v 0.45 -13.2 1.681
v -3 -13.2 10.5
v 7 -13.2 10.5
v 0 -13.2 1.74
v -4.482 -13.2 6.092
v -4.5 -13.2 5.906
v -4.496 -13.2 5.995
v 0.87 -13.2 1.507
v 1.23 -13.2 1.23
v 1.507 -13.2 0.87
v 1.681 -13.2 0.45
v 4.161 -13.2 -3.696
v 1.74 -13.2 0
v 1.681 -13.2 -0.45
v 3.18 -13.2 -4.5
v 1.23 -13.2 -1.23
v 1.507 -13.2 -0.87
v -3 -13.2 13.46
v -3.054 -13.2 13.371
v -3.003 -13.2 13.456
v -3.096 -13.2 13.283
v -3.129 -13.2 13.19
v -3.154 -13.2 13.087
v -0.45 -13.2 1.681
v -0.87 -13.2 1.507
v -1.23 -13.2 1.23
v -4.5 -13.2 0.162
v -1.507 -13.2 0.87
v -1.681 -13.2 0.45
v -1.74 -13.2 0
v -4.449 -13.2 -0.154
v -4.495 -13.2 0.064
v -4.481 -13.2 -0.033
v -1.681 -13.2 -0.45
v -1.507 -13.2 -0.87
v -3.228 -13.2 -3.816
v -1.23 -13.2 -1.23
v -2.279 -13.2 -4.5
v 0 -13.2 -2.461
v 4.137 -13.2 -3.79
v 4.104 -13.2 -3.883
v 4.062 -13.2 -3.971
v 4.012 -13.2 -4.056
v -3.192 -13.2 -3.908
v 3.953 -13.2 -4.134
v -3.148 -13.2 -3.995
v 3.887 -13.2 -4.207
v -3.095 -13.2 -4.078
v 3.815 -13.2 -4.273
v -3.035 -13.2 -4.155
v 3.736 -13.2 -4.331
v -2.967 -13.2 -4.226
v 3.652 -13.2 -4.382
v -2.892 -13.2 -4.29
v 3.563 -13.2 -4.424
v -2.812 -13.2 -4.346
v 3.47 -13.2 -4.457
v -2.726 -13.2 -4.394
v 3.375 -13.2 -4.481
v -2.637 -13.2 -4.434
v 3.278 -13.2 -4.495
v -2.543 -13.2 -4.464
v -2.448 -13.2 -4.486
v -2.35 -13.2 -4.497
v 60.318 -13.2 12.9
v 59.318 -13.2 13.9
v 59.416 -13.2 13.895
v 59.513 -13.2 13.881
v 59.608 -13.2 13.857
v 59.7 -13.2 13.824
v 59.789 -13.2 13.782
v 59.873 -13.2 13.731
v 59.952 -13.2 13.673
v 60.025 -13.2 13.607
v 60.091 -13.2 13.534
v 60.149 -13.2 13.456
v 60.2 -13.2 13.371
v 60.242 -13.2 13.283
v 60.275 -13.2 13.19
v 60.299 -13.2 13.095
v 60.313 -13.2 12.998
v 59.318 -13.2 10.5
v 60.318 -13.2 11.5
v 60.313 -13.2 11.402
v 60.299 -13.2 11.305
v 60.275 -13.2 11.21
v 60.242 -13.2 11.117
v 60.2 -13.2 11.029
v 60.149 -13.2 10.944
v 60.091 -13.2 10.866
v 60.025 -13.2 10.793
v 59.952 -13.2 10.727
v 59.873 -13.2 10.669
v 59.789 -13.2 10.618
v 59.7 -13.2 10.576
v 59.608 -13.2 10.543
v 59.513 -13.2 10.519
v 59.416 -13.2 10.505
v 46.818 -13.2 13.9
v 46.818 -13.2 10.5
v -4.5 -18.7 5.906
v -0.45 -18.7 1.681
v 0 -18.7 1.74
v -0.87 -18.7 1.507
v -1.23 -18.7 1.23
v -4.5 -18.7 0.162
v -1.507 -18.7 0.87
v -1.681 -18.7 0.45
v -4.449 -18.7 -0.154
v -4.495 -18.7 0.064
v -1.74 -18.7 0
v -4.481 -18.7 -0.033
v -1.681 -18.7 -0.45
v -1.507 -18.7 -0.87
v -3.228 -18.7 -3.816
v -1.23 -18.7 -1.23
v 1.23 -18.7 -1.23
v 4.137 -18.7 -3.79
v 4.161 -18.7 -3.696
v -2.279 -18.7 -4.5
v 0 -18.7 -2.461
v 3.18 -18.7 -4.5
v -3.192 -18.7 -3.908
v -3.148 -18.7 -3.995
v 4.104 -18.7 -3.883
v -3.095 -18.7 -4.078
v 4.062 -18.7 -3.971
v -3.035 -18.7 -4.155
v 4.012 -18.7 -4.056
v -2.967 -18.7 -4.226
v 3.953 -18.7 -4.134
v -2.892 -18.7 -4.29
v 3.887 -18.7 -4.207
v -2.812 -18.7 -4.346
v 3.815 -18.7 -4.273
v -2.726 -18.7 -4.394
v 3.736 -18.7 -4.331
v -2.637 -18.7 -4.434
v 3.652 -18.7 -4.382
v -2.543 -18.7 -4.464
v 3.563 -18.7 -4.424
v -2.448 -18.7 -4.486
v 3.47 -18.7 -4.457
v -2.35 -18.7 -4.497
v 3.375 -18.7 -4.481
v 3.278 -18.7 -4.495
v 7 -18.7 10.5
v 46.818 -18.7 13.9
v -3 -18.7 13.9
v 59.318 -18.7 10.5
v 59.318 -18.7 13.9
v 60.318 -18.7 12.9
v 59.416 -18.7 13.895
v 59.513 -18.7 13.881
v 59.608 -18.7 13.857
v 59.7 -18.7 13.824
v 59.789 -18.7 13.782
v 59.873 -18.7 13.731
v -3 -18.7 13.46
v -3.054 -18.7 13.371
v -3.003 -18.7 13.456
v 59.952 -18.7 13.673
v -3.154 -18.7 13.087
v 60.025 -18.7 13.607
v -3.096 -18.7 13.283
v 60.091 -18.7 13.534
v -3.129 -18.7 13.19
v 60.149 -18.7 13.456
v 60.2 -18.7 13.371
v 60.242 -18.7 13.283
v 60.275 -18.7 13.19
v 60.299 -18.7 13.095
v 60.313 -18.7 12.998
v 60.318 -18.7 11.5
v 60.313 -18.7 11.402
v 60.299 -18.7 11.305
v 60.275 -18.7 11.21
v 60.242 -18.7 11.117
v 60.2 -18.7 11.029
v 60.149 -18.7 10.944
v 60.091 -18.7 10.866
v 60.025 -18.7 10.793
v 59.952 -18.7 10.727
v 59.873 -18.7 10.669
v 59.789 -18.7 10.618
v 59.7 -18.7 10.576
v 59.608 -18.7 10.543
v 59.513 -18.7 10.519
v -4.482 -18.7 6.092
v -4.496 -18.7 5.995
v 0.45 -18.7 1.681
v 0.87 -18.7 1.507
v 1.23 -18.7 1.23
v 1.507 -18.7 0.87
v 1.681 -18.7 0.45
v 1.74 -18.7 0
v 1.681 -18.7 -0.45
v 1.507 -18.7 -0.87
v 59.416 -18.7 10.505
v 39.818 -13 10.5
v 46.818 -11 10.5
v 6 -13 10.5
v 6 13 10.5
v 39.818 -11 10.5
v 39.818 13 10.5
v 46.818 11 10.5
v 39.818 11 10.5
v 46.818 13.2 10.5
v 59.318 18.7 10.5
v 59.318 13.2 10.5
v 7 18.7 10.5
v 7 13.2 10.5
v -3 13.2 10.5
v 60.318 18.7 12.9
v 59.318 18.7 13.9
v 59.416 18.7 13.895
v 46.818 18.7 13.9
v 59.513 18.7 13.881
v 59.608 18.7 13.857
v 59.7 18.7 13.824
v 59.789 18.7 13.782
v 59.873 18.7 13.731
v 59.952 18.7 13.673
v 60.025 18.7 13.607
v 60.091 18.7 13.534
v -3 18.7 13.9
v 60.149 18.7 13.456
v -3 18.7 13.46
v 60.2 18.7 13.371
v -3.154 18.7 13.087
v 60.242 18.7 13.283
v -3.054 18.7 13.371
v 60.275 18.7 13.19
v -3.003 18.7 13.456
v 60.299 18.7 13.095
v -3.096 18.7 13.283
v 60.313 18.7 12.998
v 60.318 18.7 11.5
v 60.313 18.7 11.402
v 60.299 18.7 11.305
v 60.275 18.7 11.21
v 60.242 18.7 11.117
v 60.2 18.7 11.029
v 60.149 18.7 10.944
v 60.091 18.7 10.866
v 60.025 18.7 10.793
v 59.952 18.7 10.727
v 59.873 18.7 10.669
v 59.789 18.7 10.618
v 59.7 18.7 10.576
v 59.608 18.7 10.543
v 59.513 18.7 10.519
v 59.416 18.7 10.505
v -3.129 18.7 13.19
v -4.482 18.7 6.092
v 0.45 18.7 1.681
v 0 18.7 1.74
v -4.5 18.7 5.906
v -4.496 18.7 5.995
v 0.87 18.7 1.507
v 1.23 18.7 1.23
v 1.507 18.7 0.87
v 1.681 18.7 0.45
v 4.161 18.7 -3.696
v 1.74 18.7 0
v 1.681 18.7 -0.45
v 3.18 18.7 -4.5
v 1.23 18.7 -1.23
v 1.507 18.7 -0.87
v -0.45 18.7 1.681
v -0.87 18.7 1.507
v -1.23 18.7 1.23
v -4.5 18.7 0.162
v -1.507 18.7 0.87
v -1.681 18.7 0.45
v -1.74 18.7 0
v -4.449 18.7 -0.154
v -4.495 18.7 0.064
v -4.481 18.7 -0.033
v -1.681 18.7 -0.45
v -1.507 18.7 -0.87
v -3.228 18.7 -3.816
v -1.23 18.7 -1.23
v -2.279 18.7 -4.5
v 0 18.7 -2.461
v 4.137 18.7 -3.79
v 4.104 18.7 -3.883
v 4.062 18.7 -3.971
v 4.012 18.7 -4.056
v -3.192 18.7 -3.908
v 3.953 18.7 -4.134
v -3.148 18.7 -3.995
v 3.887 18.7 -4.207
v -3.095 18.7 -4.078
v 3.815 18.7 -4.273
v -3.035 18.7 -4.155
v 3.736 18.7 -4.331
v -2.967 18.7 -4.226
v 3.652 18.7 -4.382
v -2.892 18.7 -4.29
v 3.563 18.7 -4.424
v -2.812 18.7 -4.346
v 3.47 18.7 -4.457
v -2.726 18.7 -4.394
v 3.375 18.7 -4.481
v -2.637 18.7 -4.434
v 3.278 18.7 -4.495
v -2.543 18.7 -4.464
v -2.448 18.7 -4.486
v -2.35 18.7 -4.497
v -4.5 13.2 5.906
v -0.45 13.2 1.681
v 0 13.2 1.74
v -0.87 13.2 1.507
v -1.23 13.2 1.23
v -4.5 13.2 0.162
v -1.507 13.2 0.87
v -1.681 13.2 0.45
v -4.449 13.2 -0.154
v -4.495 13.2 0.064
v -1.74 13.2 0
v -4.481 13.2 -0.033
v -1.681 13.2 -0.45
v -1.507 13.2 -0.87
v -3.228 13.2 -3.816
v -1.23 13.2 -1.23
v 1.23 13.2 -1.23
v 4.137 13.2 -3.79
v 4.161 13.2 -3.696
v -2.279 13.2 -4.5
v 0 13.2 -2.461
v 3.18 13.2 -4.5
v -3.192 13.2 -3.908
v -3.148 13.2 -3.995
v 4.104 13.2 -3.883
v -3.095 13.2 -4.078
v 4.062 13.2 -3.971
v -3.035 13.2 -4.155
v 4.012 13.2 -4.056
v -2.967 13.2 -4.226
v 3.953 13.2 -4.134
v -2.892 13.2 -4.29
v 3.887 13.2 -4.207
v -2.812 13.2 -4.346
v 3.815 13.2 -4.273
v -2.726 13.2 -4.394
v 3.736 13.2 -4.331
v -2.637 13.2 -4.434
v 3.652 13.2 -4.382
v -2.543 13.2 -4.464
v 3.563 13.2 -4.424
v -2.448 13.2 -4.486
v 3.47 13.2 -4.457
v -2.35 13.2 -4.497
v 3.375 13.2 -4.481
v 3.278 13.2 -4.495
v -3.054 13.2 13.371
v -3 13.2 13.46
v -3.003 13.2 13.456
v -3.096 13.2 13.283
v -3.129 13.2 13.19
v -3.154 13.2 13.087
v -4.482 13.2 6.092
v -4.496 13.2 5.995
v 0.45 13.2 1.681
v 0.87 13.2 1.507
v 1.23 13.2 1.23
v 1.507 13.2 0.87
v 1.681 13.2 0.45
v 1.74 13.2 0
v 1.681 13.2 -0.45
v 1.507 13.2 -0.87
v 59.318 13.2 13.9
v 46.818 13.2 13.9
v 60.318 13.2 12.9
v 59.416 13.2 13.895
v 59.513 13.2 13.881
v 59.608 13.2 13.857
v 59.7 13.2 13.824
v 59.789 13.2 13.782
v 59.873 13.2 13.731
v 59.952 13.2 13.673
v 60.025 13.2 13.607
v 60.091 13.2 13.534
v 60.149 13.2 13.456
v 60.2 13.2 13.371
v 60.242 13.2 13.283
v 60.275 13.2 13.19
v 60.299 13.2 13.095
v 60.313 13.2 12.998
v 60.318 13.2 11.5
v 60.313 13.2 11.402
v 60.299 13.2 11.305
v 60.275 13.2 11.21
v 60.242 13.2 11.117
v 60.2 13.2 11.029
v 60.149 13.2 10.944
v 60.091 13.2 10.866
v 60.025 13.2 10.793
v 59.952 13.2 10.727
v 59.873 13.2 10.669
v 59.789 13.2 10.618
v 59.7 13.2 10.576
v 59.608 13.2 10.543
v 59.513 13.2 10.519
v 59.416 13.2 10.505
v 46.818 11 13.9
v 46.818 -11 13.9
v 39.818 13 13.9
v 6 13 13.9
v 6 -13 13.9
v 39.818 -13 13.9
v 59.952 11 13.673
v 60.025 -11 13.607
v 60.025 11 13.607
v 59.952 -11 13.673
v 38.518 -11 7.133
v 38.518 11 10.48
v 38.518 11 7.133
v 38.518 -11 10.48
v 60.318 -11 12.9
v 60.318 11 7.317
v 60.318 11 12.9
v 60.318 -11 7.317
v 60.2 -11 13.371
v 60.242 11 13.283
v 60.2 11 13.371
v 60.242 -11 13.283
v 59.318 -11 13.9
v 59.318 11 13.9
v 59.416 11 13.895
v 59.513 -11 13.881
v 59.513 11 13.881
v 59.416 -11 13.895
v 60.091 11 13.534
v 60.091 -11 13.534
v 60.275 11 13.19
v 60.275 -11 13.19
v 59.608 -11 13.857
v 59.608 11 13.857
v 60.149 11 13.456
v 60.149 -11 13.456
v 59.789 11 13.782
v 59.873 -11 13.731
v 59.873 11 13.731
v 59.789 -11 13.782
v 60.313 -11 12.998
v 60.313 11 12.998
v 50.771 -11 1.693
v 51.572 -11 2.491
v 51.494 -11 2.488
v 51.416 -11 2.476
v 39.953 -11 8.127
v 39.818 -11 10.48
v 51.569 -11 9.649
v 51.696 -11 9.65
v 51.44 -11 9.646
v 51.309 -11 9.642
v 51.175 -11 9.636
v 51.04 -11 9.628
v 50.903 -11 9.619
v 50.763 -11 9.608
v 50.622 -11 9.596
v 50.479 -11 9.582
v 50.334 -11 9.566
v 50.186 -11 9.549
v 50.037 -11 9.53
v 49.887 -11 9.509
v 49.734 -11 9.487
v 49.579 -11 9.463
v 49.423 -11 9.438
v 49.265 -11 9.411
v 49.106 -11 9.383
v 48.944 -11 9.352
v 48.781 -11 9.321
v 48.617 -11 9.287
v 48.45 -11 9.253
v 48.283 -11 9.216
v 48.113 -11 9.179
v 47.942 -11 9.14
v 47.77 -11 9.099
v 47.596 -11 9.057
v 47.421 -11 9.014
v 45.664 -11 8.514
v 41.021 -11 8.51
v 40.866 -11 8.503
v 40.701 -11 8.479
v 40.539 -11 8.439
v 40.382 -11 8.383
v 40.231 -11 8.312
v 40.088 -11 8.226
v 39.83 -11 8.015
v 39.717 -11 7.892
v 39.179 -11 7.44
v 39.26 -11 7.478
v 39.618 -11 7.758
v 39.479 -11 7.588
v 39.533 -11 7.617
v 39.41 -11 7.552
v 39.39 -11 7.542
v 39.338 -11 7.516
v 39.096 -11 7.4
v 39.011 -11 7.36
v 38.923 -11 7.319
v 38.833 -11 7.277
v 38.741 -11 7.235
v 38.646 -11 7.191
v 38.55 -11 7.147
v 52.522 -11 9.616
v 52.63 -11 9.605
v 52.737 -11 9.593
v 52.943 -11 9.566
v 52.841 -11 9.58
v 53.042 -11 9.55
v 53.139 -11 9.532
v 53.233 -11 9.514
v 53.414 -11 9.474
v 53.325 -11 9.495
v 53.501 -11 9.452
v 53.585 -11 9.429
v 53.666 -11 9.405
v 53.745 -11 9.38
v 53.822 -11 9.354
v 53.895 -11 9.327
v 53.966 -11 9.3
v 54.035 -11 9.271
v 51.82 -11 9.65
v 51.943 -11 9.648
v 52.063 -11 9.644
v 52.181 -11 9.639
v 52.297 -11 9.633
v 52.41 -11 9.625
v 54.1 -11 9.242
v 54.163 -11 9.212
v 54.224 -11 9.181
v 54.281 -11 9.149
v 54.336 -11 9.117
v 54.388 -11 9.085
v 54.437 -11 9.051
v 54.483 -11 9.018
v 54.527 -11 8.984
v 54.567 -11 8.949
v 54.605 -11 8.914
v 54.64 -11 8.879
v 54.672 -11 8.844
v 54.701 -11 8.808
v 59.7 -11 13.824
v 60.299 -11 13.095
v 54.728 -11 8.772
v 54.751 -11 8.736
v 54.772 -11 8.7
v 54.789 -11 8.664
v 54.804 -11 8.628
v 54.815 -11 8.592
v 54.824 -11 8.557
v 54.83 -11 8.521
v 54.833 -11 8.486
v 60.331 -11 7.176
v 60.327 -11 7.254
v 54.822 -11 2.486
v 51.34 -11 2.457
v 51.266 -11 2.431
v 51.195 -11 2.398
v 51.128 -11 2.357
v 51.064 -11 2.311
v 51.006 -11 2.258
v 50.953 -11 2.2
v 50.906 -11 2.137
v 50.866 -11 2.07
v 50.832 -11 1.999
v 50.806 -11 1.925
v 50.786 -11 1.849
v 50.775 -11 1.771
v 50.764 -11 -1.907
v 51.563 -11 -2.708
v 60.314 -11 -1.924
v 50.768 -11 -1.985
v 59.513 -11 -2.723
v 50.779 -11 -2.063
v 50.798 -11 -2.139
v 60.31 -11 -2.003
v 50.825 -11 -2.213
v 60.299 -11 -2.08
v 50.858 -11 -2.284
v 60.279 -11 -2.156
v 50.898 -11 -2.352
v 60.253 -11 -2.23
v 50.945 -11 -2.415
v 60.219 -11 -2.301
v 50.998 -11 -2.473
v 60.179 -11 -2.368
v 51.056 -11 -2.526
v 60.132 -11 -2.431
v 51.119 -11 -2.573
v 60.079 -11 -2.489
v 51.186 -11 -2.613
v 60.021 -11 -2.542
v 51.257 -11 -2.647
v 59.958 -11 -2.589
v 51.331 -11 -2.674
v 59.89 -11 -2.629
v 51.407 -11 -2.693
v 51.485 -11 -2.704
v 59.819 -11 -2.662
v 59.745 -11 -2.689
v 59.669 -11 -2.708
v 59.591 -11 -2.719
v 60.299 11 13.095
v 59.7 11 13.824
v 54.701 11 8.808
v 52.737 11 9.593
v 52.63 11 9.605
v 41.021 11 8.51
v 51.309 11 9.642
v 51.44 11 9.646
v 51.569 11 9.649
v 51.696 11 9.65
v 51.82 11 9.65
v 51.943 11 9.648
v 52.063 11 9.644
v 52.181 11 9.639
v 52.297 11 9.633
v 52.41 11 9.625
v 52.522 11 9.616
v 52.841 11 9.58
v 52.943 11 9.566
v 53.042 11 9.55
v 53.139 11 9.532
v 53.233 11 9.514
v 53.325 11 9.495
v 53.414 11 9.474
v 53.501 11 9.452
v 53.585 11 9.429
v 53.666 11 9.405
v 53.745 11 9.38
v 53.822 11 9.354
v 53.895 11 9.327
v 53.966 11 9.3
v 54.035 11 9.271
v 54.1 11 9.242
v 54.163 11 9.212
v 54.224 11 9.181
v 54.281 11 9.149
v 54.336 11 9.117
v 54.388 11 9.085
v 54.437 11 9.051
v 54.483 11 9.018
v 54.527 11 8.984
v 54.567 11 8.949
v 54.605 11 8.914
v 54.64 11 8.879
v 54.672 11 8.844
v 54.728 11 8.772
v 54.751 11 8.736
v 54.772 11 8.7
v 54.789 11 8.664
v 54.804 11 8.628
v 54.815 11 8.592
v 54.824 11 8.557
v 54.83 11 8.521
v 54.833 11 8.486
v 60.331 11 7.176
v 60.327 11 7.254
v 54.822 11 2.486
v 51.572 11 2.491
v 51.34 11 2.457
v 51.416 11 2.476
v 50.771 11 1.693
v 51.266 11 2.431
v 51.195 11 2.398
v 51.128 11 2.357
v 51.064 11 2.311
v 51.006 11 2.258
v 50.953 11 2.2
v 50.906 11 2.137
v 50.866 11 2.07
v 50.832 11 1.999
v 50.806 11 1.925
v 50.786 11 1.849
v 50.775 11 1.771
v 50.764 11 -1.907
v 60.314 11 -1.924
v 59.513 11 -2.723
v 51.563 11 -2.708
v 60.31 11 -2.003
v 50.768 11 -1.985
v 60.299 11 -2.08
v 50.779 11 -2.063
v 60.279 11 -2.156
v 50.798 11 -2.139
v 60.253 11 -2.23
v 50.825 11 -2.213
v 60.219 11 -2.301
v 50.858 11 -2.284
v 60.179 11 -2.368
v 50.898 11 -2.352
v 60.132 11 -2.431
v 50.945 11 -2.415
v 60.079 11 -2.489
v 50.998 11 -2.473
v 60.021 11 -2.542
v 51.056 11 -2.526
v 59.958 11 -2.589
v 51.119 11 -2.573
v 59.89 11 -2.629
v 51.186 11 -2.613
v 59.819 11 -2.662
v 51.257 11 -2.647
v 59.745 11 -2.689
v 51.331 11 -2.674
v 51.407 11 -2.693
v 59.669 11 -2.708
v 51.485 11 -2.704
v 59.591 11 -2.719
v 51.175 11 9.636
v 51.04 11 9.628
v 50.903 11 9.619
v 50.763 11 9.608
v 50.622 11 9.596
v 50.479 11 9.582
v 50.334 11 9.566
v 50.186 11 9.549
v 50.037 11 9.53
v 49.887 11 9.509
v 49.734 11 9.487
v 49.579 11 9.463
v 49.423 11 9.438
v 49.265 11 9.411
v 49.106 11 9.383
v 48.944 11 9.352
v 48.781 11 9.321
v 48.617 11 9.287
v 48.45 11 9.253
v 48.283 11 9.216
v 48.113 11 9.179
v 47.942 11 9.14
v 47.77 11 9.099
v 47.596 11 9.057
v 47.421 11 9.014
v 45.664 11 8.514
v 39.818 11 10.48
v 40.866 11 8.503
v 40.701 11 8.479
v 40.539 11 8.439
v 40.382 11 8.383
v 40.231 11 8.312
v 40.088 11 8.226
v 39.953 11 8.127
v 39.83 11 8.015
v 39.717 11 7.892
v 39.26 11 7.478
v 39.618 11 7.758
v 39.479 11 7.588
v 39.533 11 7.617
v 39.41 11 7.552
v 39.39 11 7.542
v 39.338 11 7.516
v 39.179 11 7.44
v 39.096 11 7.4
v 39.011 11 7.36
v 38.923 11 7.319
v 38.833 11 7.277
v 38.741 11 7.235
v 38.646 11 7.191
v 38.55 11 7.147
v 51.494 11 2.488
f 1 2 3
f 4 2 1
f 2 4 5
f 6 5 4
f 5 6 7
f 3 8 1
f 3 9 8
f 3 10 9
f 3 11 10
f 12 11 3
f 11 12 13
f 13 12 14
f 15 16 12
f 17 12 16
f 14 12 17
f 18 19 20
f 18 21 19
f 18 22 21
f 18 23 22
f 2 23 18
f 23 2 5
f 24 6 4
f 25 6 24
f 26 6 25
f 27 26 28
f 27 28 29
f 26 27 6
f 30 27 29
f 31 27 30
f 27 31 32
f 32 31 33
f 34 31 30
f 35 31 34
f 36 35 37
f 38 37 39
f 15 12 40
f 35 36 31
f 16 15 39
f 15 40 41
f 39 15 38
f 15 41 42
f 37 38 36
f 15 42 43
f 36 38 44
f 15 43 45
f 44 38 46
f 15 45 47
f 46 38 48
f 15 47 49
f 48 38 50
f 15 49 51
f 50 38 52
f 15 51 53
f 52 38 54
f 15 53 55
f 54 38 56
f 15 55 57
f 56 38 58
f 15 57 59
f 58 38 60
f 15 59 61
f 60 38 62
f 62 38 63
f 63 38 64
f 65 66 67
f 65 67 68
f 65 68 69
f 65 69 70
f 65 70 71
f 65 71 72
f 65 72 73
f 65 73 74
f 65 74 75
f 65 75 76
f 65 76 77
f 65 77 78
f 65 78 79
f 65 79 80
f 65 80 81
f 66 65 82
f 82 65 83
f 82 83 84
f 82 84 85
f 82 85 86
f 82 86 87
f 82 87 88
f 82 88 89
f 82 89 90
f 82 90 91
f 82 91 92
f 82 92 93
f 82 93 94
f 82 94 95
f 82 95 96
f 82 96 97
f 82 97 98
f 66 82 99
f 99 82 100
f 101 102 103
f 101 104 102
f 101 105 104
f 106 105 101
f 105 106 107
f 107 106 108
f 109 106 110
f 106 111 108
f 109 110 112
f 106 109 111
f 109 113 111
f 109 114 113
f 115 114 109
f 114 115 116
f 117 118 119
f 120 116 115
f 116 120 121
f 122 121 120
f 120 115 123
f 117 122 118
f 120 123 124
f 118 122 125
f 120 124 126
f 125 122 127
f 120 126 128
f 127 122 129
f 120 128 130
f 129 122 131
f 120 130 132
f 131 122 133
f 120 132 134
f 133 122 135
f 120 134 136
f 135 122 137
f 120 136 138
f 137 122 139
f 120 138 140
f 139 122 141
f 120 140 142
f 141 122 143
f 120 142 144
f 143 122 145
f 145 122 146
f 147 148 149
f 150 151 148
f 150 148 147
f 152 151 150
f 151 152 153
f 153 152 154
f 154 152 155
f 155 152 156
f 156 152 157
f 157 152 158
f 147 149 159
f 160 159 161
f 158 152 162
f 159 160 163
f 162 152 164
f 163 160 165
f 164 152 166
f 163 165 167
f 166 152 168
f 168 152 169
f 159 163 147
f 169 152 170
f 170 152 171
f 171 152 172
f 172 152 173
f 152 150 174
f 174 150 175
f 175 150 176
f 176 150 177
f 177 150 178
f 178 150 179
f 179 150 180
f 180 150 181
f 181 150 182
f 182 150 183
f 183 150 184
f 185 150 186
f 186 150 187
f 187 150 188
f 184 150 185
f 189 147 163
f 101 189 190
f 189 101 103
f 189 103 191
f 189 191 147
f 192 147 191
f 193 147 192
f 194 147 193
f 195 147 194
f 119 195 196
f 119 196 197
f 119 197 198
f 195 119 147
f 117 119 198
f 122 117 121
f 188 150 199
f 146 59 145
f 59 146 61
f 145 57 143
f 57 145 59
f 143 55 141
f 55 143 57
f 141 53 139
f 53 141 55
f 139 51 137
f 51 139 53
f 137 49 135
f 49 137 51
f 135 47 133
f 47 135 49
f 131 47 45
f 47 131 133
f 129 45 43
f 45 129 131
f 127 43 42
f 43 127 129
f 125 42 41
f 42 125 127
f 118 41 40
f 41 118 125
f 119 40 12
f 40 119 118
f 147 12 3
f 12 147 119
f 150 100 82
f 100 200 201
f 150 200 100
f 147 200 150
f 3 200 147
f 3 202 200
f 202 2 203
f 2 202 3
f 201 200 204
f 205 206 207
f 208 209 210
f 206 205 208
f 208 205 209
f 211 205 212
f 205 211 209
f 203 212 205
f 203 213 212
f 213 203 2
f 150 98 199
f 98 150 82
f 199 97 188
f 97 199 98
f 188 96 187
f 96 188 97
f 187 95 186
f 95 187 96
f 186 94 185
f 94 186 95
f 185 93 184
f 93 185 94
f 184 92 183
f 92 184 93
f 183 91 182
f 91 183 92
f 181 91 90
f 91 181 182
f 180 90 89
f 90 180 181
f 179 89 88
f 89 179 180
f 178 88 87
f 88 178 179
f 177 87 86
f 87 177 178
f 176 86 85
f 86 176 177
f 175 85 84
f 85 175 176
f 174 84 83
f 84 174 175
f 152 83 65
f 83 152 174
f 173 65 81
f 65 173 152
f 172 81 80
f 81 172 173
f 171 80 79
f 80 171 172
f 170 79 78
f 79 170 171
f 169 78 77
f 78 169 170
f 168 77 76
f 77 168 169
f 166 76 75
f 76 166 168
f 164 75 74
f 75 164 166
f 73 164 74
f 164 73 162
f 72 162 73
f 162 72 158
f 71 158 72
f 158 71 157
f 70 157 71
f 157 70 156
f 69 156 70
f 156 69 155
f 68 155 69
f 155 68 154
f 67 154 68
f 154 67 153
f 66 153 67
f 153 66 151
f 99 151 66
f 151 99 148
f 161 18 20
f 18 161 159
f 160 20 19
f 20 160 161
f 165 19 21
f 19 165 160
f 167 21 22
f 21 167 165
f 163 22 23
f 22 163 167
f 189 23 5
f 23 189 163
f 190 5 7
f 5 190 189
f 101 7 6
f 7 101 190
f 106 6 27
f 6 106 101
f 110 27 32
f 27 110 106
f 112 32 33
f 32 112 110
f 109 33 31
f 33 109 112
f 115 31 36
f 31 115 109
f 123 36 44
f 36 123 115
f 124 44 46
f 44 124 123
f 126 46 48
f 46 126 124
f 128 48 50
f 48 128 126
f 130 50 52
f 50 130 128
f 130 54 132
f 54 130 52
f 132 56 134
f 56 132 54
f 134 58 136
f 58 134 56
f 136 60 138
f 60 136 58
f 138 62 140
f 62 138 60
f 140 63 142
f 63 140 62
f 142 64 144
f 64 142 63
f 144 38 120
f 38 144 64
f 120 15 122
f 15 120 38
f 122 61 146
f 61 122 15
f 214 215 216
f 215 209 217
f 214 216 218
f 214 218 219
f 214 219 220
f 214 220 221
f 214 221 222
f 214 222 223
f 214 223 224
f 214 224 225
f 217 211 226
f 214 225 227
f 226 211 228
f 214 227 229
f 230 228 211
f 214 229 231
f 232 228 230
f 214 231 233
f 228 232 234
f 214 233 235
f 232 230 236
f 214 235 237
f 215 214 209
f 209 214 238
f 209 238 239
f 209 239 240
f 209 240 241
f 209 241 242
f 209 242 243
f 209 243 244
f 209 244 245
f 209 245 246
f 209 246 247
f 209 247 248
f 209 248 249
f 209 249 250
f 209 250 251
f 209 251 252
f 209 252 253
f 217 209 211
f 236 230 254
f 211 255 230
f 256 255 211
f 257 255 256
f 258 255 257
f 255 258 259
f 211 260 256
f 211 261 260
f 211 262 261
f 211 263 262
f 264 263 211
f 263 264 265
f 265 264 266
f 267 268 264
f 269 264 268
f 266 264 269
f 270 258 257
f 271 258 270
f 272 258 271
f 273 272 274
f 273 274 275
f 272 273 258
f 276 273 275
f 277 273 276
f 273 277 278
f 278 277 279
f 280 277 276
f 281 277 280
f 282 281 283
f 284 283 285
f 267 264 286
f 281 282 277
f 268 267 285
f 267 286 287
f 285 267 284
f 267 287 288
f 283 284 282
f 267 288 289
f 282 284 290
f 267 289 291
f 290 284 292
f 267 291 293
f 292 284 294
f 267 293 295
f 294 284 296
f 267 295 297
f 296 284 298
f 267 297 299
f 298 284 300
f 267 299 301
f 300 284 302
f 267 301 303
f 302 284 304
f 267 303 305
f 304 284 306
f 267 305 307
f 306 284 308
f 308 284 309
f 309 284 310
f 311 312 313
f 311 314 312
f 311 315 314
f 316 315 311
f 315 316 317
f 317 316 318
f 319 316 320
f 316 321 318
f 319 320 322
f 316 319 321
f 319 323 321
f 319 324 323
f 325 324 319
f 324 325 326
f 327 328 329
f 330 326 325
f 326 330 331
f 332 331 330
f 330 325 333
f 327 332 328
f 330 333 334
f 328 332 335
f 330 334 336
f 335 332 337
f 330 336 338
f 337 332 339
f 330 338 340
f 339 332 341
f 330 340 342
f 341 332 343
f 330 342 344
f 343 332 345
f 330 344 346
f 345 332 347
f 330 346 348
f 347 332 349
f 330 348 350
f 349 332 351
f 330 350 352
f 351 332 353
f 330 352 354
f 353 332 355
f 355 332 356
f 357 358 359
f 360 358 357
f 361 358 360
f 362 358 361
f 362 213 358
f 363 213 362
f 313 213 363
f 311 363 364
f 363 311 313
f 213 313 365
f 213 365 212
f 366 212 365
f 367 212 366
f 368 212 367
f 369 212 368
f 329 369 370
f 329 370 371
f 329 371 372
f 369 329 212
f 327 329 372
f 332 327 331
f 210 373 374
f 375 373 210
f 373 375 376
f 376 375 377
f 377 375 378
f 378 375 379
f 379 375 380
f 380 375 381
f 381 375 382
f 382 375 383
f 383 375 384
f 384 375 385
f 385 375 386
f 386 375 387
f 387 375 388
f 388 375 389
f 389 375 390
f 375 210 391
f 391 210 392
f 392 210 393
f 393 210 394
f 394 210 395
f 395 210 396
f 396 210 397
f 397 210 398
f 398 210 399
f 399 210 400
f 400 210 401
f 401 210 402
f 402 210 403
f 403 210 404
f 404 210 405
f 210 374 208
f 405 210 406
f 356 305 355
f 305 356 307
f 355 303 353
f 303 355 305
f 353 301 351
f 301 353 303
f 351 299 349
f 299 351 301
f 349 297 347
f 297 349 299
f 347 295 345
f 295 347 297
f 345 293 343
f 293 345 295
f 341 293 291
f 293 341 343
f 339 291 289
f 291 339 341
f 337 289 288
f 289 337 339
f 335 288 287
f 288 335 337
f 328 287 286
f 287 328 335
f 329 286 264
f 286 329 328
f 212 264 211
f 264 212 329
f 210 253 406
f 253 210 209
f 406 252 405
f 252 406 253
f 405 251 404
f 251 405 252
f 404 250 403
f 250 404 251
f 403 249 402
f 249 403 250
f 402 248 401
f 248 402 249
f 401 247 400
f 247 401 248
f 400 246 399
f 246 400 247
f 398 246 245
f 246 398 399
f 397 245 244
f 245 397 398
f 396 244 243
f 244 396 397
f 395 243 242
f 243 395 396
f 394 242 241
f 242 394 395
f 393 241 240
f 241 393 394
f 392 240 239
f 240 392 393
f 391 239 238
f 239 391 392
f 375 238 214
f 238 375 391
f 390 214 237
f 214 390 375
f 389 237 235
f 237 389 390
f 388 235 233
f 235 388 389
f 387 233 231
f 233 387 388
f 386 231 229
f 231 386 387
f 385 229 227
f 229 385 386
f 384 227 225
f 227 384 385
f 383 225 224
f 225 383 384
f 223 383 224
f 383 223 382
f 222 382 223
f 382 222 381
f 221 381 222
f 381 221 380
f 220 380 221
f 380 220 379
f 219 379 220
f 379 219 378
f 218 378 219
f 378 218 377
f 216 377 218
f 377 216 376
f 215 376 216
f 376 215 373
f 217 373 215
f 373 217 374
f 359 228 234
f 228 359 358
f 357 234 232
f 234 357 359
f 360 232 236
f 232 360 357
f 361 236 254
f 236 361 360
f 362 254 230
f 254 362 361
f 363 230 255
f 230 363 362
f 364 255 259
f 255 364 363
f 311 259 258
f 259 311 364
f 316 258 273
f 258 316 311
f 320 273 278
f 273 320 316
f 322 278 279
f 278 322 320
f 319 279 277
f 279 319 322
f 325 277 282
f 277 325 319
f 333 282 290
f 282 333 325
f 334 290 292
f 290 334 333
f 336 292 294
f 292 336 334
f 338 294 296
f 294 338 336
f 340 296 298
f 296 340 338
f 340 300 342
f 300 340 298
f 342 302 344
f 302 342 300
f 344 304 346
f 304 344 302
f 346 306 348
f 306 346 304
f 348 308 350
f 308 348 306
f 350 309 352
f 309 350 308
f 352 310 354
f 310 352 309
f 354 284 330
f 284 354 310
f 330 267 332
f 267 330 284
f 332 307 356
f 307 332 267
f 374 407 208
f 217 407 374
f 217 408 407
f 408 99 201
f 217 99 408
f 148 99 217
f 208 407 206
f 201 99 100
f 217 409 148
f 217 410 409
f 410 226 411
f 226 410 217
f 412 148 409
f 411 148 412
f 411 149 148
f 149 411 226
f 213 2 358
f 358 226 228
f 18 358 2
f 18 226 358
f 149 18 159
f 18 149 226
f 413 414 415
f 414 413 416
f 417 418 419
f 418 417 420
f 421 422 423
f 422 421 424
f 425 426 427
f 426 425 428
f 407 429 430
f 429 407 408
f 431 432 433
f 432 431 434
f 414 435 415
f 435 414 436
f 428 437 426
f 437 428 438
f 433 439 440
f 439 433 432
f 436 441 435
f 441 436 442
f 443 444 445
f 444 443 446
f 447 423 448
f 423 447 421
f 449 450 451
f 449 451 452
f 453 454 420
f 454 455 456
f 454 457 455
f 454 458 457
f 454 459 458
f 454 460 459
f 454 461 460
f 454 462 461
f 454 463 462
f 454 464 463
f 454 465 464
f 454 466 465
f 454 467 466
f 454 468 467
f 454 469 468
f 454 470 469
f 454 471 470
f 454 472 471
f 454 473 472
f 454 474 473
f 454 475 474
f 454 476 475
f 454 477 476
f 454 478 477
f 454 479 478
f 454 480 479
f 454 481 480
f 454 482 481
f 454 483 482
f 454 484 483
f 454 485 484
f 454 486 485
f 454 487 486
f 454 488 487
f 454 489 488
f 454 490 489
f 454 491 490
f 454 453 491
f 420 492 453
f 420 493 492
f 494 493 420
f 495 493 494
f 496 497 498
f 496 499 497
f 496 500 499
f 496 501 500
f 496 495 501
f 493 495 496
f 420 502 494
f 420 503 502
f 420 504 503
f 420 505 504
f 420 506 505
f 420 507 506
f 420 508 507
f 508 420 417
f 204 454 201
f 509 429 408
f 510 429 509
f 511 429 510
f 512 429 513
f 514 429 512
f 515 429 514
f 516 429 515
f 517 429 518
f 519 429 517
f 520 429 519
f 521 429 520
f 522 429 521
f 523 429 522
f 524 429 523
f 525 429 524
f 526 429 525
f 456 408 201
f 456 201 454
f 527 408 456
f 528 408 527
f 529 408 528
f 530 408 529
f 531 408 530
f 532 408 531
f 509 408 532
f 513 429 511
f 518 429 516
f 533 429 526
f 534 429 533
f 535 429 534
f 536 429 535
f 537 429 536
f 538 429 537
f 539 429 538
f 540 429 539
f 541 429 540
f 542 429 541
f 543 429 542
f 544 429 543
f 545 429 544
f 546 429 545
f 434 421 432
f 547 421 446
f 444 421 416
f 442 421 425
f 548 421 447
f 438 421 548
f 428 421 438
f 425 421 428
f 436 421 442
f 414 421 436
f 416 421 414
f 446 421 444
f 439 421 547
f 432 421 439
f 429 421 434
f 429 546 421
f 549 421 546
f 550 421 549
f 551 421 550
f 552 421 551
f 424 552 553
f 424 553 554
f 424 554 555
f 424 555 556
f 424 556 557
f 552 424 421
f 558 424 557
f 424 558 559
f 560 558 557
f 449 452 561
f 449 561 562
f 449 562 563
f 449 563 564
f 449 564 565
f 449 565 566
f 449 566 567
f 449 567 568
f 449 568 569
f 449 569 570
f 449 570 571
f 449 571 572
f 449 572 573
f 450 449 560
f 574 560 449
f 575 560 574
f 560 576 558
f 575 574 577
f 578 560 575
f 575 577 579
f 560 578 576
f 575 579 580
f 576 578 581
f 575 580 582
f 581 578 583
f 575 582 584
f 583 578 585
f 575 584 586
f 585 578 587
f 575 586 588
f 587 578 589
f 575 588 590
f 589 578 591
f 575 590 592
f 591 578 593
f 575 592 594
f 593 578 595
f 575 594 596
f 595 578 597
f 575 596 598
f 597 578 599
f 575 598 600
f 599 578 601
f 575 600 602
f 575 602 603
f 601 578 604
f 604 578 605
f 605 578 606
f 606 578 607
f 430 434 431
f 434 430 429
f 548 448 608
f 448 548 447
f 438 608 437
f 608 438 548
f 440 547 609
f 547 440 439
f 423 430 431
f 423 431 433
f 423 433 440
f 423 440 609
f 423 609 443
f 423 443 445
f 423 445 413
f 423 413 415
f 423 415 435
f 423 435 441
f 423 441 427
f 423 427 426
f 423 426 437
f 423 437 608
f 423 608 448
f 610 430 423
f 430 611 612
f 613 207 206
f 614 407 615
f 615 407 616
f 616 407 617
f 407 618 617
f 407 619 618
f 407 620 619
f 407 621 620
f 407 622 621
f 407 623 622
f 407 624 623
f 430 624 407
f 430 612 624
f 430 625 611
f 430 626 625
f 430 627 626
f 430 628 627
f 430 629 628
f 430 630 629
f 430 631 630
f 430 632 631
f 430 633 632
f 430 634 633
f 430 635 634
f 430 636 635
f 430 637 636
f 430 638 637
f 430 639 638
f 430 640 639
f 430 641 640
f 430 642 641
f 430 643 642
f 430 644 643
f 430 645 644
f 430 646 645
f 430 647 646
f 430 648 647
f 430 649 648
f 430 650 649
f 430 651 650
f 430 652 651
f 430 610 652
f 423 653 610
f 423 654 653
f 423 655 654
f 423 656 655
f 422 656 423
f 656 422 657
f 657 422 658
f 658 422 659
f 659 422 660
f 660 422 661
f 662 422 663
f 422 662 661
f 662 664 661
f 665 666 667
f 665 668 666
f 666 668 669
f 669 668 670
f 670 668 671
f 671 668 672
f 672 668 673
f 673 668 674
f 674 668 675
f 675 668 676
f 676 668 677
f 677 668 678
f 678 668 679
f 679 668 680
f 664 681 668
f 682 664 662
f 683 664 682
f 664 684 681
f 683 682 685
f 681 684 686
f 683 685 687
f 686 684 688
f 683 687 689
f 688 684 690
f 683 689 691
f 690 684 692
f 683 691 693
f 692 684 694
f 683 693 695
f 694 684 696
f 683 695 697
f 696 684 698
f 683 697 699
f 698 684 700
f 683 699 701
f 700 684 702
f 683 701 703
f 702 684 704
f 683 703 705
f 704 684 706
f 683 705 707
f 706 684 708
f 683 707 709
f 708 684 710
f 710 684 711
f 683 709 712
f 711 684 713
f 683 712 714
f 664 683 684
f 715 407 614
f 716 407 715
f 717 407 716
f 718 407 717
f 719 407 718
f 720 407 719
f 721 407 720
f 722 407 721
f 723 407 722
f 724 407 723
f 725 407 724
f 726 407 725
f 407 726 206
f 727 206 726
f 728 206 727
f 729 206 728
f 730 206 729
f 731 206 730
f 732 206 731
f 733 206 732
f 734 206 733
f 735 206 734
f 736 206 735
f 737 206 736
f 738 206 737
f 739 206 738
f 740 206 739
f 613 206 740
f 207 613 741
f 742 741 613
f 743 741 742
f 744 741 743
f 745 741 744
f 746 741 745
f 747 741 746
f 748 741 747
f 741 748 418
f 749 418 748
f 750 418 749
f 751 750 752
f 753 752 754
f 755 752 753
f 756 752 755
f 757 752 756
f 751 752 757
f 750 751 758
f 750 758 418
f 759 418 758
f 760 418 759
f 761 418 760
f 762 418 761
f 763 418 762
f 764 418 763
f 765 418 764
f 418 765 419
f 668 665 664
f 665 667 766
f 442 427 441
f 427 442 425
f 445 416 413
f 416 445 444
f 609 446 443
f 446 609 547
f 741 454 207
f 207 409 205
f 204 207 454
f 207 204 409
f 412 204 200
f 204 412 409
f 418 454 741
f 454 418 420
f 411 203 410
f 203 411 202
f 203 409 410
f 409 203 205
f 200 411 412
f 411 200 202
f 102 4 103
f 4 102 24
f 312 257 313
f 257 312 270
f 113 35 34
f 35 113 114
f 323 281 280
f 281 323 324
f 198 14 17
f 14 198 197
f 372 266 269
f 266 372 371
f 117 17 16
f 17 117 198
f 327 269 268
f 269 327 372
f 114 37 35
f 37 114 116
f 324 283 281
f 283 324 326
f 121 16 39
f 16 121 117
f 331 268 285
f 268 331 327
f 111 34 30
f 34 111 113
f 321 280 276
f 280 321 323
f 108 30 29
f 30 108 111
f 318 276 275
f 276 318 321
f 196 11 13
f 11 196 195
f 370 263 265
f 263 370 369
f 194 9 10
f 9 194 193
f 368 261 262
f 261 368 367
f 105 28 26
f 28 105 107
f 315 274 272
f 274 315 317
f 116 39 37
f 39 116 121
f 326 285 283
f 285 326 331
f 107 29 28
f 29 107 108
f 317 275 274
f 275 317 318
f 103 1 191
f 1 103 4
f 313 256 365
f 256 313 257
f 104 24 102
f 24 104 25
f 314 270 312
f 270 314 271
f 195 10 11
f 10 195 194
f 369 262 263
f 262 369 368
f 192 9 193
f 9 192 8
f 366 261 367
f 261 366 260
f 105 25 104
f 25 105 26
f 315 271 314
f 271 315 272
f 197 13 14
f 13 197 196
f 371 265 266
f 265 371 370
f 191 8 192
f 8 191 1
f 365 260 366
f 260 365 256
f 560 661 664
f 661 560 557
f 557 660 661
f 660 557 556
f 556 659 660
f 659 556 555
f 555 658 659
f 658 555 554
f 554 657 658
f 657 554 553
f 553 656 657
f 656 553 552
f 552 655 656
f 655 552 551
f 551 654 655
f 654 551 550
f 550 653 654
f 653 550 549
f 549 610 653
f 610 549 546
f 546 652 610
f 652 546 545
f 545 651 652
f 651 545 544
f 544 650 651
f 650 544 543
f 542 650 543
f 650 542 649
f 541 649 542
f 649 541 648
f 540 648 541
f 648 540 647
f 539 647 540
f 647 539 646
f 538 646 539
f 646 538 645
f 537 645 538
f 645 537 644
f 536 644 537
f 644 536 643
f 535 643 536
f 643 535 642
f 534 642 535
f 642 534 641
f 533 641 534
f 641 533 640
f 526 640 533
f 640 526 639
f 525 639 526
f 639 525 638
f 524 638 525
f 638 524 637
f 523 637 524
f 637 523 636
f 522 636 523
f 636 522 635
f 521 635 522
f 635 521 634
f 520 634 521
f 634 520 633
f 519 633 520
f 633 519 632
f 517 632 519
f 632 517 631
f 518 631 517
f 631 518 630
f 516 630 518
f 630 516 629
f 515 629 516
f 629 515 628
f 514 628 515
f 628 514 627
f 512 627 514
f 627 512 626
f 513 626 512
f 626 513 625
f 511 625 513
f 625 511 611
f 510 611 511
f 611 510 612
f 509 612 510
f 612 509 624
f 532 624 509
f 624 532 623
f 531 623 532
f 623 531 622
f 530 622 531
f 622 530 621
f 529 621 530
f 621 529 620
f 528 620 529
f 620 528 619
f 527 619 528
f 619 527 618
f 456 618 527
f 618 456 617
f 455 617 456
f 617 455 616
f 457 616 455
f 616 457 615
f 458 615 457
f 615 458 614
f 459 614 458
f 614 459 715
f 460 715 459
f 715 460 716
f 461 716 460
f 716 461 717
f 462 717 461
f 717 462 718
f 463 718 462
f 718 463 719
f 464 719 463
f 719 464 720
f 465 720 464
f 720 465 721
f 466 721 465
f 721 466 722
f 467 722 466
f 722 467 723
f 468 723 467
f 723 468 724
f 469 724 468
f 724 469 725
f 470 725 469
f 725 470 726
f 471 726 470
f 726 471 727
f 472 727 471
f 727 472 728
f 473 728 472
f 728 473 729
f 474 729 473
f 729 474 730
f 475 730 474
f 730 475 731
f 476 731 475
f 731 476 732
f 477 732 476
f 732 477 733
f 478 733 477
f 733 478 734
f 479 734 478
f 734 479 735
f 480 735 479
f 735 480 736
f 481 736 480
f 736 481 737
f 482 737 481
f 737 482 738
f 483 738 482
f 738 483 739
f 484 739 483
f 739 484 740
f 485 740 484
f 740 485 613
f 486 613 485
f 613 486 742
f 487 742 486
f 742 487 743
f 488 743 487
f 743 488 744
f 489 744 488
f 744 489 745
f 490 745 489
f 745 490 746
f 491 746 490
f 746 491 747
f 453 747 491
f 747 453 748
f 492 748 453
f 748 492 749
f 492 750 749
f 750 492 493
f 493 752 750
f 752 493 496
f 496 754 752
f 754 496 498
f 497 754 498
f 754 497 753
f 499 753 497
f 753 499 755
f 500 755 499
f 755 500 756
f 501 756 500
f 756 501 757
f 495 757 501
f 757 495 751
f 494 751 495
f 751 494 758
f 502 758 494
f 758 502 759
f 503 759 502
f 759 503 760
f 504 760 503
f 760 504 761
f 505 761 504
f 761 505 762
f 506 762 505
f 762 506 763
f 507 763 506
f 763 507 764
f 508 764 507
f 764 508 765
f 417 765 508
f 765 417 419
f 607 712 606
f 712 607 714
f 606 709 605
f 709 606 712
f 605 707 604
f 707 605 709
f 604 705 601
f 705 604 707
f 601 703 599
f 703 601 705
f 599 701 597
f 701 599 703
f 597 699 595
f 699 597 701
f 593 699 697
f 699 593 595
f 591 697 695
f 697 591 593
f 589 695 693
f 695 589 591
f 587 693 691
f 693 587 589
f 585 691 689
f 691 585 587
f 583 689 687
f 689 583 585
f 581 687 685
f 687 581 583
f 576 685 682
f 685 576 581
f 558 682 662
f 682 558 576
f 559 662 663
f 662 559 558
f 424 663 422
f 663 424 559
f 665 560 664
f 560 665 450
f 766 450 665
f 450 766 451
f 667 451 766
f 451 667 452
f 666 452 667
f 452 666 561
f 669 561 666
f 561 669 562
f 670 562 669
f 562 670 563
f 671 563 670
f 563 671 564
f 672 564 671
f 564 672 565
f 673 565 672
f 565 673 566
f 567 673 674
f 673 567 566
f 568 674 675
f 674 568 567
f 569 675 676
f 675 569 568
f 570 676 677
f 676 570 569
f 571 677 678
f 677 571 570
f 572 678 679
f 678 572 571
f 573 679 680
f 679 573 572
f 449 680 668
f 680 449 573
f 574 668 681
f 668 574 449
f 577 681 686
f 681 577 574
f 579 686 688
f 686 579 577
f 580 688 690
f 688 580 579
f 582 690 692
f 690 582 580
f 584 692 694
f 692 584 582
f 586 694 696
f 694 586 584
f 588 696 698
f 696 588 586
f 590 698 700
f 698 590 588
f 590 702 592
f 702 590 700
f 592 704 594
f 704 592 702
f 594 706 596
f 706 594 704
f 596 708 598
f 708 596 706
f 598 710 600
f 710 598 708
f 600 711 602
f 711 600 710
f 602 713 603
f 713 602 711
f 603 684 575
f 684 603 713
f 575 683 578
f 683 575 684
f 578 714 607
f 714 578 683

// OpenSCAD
// CC0 GoPro Hero 9 clasp silhouette inspired, two-axis draw-latch trial. mm.
// Independent host base and keeper are provisional; not an OEM replacement.
// Bambu Lab PETG Basic, 1 mm EPDM liner, stainless M3 hinge pins.
use <../../../../scad/lib/util.scad>
/* [Output] */
part = "lever"; // [base,link,lever,keeper,epdm,seam_epdm,axle_a,axle_b,assembly,open]
/* [Interface dimensions - provisional] */
link_length = 12;
closed_angle = 190;
catch_distance = 35;
axis_height = 10.5;
pad_thickness = 5;
pad_width = 55;
base_left = -17;
base_right = 16.6;
keeper_left = -17.6;
keeper_right = 3; // Cavity back is flush with the mounting plate edge.
keeper_pad_width = 55;
mount_y = 23;
keeper_mount_x = -12;
keeper_mount_x2 = -4;
keeper_mount_y = 23;
mount_d = 3.45;
keeper_adjust = 1.5;
/* [Moving parts] */
center_width = 14;
link_thickness = 5;
cheek_thickness = 5.5;
side_gap = 0.6;
eye_radius = 4.5;
roof_bottom = 10.5;
roof_thickness = 3.4;
hook_wall = 6;
hook_rear_extension = 0.8; // Keep the loaded front jaw; shorten the unsupported rear roof.
hook_width = 22;
hook_depth = -2; // Raise the main jaw belly; separate reinforced toe sits below.
hook_tip_fillet = 2.5;
hook_tip_round = 0.8;
hook_back_clearance = 1;
root_fillet = 3;
lever_fillet = 2.5;
edge_round = 1;
/* [Integral printed keeper] */
catch_height = 8.5;
keeper_height = 16.5; // 4 mm lip above the lined cavity.
keeper_top_round = 1.2;
keeper_ridge_width = 36;
keeper_web_thickness = 14; // Groove leaves a 10 mm solid neck.
keeper_groove_depth = 4;
keeper_groove_bottom = 0; // Open to the plate edge: no floor beneath the hook.
keeper_groove_top = 12.5;
keeper_groove_radius = 3;
hook_toe_bottom = 5.8;
hook_toe_top = 11.0;
release_angle = 115;
/* [EPDM lining the complete FIXED cavity: back, roof and both sides] */
epdm_thickness = 1.0; // User's sheet. Assume solid EPDM; confirm foam/adhesive thickness before use.
epdm_precompression = 0.05; // Hook liner is only anti-rattle; the joint sheet supplies preload.
seam_width = 38;
seam_height = 14;
seam_pad_width = 24;
seam_pad_height = 8;
seam_pad_z = 4;
seam_closed_gap = 0.8; // Installed 1 mm sheet compresses by 0.2 mm at the mating flange.
flange_depth = 2.6;
backing_height = 12.5; // 0.6+ mm running clearance below the reinforced lever web.
base_relief_thickness = 2.5;
/* [Metal hardware - verify purchased parts] */
axle_d = 3;
axle_hole = 3.45;
catch_clearance = 0.5;
axle_a_length = 40;
axle_b_length = 50;
/* [Hidden] */
$fn=64;
eps=0.02;
link_y = center_width/2+side_gap;
cheek_y = link_y+link_thickness+side_gap;
outer_y = cheek_y+cheek_thickness;
roof_top = roof_bottom+roof_thickness;
catch_r = keeper_web_thickness/2+catch_clearance;
bx = link_length*cos(closed_angle);
bz = link_length*sin(closed_angle);
lever_length = sqrt(pow(catch_distance-bx,2)+pow(catch_height-axis_height-bz,2));
stop_z = axis_height+bz-eye_radius;
epdm_closed_thickness = epdm_thickness-epdm_precompression;
keeper_groove_width = hook_width+2*(epdm_thickness+side_gap);
epdm_width = keeper_groove_width-2*epdm_thickness;
epdm_main_length = keeper_groove_top-keeper_groove_radius
    +PI/2*(keeper_groove_radius-epdm_thickness/2)
    +keeper_groove_depth-keeper_groove_radius;
hook_underlap = keeper_groove_depth-epdm_closed_thickness;
hook_tip_x = keeper_web_thickness/2-hook_underlap;
assert(stop_z>base_relief_thickness && roof_bottom>eye_radius);
assert(epdm_precompression>0 && epdm_precompression<epdm_thickness);
assert(keeper_right==keeper_web_thickness/2-keeper_groove_depth);
assert(keeper_groove_radius>epdm_thickness);
assert(hook_toe_bottom>keeper_groove_bottom && hook_toe_top<keeper_groove_top);
assert(hook_underlap>0 && hook_underlap<keeper_groove_depth);
assert(keeper_ridge_width>hook_width+2*side_gap && keeper_ridge_width<pad_width);
assert(hook_rear_extension>=0 && hook_rear_extension<hook_wall);
assert(keeper_height>catch_height && catch_height>=pad_thickness+root_fillet);
assert(closed_angle>180 && closed_angle<210);
assert(abs(catch_distance+keeper_left-base_right-seam_closed_gap)<0.001);
assert(seam_closed_gap>0 && seam_closed_gap<epdm_thickness);
assert(seam_width<pad_width-2 && backing_height<roof_bottom+axis_height);
assert(seam_pad_width<seam_width && seam_pad_z+seam_pad_height<=seam_height);

function latch_b(theta=closed_angle) = [link_length*cos(theta),0,axis_height+link_length*sin(theta)];
function latch_cx(theta=closed_angle) = link_length*cos(theta)+sqrt(lever_length*lever_length-pow(catch_height-axis_height-link_length*sin(theta),2));
function latch_phi(theta=closed_angle) = asin((catch_height-axis_height-link_length*sin(theta))/lever_length);

// XZ profile extruded along +Y. Local 2D Y maps to world Z.
module profile_y(y,t) { translate([0,y+t,0]) rotate([90,0,0]) linear_extrude(t) children(); }
// Horizontal M3 pivot bores retain a circular bearing arc. The pointed top
// prints without a supported bore ceiling: +Z for the upright base, -Z for
// the lever printed face-down. Links print with vertical holes and stay round.
module axle_cut(y,len,apex=0) {
    if(apex==0) translate([0,y,0]) rotate([-90,0,0]) hole(axle_hole,len,fn=24);
    else profile_y(y,len) let(r=axle_hole/2/cos(180/24)) union() {
        circle(r=r,$fn=24);
        polygon([[-r/sqrt(2),apex*r/sqrt(2)],
            [0,apex*r*sqrt(2)],[r/sqrt(2),apex*r/sqrt(2)]]);
    }
}
module rounded_pad(x0,length,width=pad_width) {
    translate([x0,-width/2,0]) box_rounded(length,width,pad_thickness,2,0.3);
}
// Concave circular root fillets, additive, not merely a cosmetic outer round.
module root_haunches(y,t,half=eye_radius,sides=[-1,1]) {
    for(s=sides) scale([s,1,1]) profile_y(y,t)
        difference() {
            translate([half-eps,pad_thickness-eps]) square([root_fillet+eps,root_fillet+eps]);
            translate([half+root_fillet,pad_thickness+root_fillet]) circle(r=root_fillet);
        }
}
module softened_profile() {
    // Close concave corners by adding R2.5 material, then round convex R1 edges.
    offset(r=edge_round) offset(delta=-edge_round)
        offset(delta=-lever_fillet) offset(r=lever_fillet) children();
}
// For host integration use with_pad=false and merge root down to z=0.
module latch_base(with_pad=true,with_holes=true) {
    difference() {
        union() {
            if(with_pad) difference() {
                rounded_pad(base_left,base_right-base_left);
                // Rear relief allows B to sit below the pad top. Mounting strips
                // and the central A bearing keep the full 5 mm mounting pad.
                translate([base_left-eps,-outer_y-0.5,base_relief_thickness])
                    cube([1-base_left+eps,2*(outer_y+0.5),pad_thickness]);
            }
            translate([-eye_radius,-center_width/2,0]) cube([2*eye_radius,center_width,axis_height]);
            translate([0,-center_width/2,axis_height]) rotate([-90,0,0]) cylinder(r=eye_radius,h=center_width);
            // 45-degree rooted buttresses start on the relieved pad surface;
            // the former horizontal haunch undersides needed local support.
            for(s=[-1,1]) scale([s,1,1]) profile_y(-center_width/2,center_width)
                polygon([[eye_radius-eps,base_relief_thickness-eps],
                    [eye_radius+root_fillet,base_relief_thickness-eps],
                    [eye_radius-eps,base_relief_thickness+root_fillet]]);
            // Standing rear flange bears on the compressed EPDM at the joint.
            // It also supports the area behind the movable clasp.
            translate([base_right-flange_depth,-seam_width/2,0])
                box_rounded(flange_depth,seam_width,seam_height,1.0,0.25);
            // Closed-position stop: both link eye bottoms rest here.
            translate([base_left,-link_y-link_thickness,0]) cube([-6-base_left,2*(link_y+link_thickness),stop_z]);
        }
        translate([0,0,axis_height]) axle_cut(-center_width/2-eps,center_width+2*eps,1);
        if(with_pad && with_holes) for(x=[-10,3],y=[-mount_y,mount_y])
            translate([x,y,-eps]) hole(mount_d,pad_thickness+2*eps,fn=24);
    }
}
// A at origin, B at +X. Thickness runs +Y; print with axle holes vertical.
module latch_link() {
    difference() {
        union() {
            profile_y(0,link_thickness) translate([0,-eye_radius]) square([link_length,2*eye_radius]);
            for(x=[0,link_length]) translate([x,0,0]) rotate([-90,0,0]) cylinder(r=eye_radius,h=link_thickness);
        }
        for(x=[0,link_length]) translate([x,0,0]) axle_cut(-eps,link_thickness+2*eps);
    }
}
// Rounded outside profile; underside/root fillets are formed by the groove cut.
module keeper_profile(bottom=0) {
    w=keeper_web_thickness/2;
    offset(r=keeper_top_round) offset(delta=-keeper_top_round)
        translate([-w,bottom]) square([2*w,keeper_height-bottom]);
}
// Swept socket for a FIXED keeper, retaining the reinforced rear jaw.
// The positive retaining toe is added separately after this clearance is cut.
module keeper_socket() {
    intersection() {
        union() for(t=[release_angle:1:closed_angle-1]) hull() for(a=[t,min(t+1,closed_angle)])
            rotate(-latch_phi(a)) translate([catch_distance-latch_cx(a),-catch_height]) union() {
                offset(delta=catch_clearance) keeper_profile(bottom=-30);
                translate([0,-30]) square([keeper_web_thickness/2+hook_back_clearance,
                    keeper_height+catch_clearance+30]);
            }
        // Limit rear clearance so the structural jaw retains its wall thickness.
        rotate(-latch_phi(closed_angle)) translate([-100,-100])
            square([100+keeper_web_thickness/2+hook_back_clearance,200]);
    }
}
// B at origin; catch reference C at +X. U-shaped roof resembles photo lever.
module latch_lever() {
    union() {
    difference() {
        union() {
            for(y=[-outer_y,cheek_y]) profile_y(y,cheek_thickness) softened_profile()
                polygon([[-eye_radius,0],[-3,-eye_radius],[4,-eye_radius],[7,roof_bottom],
                    [lever_length+catch_r+hook_wall,roof_bottom],[lever_length+catch_r+hook_wall,roof_top],
                    [lever_length-4,roof_top],[-3,roof_top],[-eye_radius,6]]);
            translate([-3,-outer_y,roof_bottom]) cube([lever_length+3,2*outer_y,roof_thickness]);
            // Main hook body; positive undercut toe is added below separately.
            profile_y(-hook_width/2,hook_width) softened_profile()
                translate([lever_length-catch_r-hook_rear_extension,-hook_depth])
                    square([2*catch_r+hook_wall+hook_rear_extension,roof_top+hook_depth]);
        }
        // The large open window and the twin longitudinal rails carry the
        // GoPro housing clasp's characteristic thin U silhouette. Keep the
        // rear hinge bridge and front hook bridge uncut.
        // Long, broad central opening and slim parallel rails, closer to the
        // curved camera-housing clasp than the previous solid-roof prototype.
        translate([6,-13,roof_bottom-eps])
            cube([lever_length-13,26,roof_thickness+2*eps]);
        axle_cut(-outer_y-eps,2*outer_y+2*eps,-1);
        profile_y(-hook_width/2-eps,hook_width+2*eps)
            translate([lever_length,0]) keeper_socket();
    }
    // Positive hook toe, under the keeper ledge. Add AFTER the socket cut so
    // the release clearance cannot erase the retaining feature.
    translate([lever_length,0,0]) rotate([0,latch_phi(closed_angle),0])
        profile_y(-hook_width/2,hook_width)
            offset(r=hook_tip_round) offset(delta=-hook_tip_round)
                offset(delta=-hook_tip_fillet) offset(r=hook_tip_fillet)
                polygon([[hook_tip_x,hook_toe_bottom-catch_height],
                    [catch_r+hook_wall,hook_toe_bottom-catch_height],
                    [catch_r+hook_wall,8],
                    [keeper_web_thickness/2+hook_back_clearance,8],
                    [keeper_web_thickness/2+hook_back_clearance,hook_toe_top-catch_height],
                    [hook_tip_x,hook_toe_top-catch_height]]);
    }
}
// Open-ended cavity profile; bottom rounding is below the mounting plane.
module keeper_groove_profile() {
    offset(r=keeper_groove_radius) offset(delta=-keeper_groove_radius)
        translate([keeper_right,-keeper_groove_radius-1])
            square([keeper_groove_depth+root_fillet+1,
                keeper_groove_top+keeper_groove_radius+1]);
}
module liner_clip() {
    translate([keeper_right,0]) square([keeper_groove_depth,keeper_groove_top]);
}
// Low rectangular ridge: full-width material directly joins the host.
module latch_keeper(with_pad=true,with_holes=true) {
    difference() {
        union() {
            if(with_pad) rounded_pad(keeper_left,keeper_right-keeper_left,keeper_pad_width);
            profile_y(-keeper_ridge_width/2,keeper_ridge_width) keeper_profile();
            root_haunches(-keeper_ridge_width/2,keeper_ridge_width,half=keeper_web_thickness/2,sides=[-1]);
            // Opposed flange and raised backing land. Unlike the earlier
            // separated pads, these faces carry the draw load across EPDM.
            translate([keeper_left,-seam_width/2,0])
                box_rounded(flange_depth,seam_width,seam_height,1.0,0.25);
            translate([keeper_left+flange_depth,-seam_width/2,pad_thickness])
                box_rounded(-keeper_web_thickness/2-(keeper_left+flange_depth),
                    seam_width,backing_height-pad_thickness,1.5,0.25);
        }
        // Central undercut: solid neck remains, side cheeks resist Y escape.
        profile_y(-keeper_groove_width/2,keeper_groove_width) keeper_groove_profile();
        if(with_pad && with_holes) for(y=[-keeper_mount_y,keeper_mount_y]) {
            // X-adjustable two-hole pattern, deliberately beyond pin supports.
            for(x=[keeper_mount_x,keeper_mount_x2]) hull() for(dx=[-keeper_adjust,keeper_adjust])
                translate([x+dx,y,-eps]) hole(mount_d,pad_thickness+2*eps,fn=24);
        }
    }
}
// Three purchased sheet pieces in KEEPER coordinates. Never print them.
module liner_nominal() {
    // Main bent strip covers the complete back and ceiling, between side sheets.
    profile_y(-epdm_width/2,epdm_width) intersection() {
        liner_clip();
        difference() { keeper_groove_profile(); offset(delta=-epdm_thickness) keeper_groove_profile(); }
    }
    for(y=[-keeper_groove_width/2,epdm_width/2])
        profile_y(y,epdm_thickness) intersection() { liner_clip(); keeper_groove_profile(); }
}
module latch_epdm(theta=closed_angle,free_angle=undef,uncompressed=false) {
    phi=is_undef(free_angle)?latch_phi(theta):free_angle;
    difference() {
        liner_nominal();
        // Geometric installed envelope only, not an elastomer constitutive model.
        if(!uncompressed) translate(latch_b(theta)-[catch_distance,0,0])
            rotate([0,-phi,0]) latch_lever();
    }
}
// Installed envelope of the second 1 mm EPDM strip at the actual joint.
// The free sheet is thicker than this space; its compression provides preload.
module latch_seam_epdm() {
    translate([base_right,-seam_pad_width/2,seam_pad_z])
        cube([seam_closed_gap,seam_pad_width,seam_pad_height]);
}
// Reserved metal envelopes, not printable hardware. Head + shank + nut space.
module metal_axle(span,length) {
    translate([0,-span/2,0]) rotate([-90,0,0]) {
        cylinder(d=axle_d,h=length);
        translate([0,0,-3]) cylinder(d=5.5,h=3);
        translate([0,0,span+0.5]) cylinder(d=6.4,h=4);
    }
}
module latch_assembly(theta=closed_angle,free_angle=undef) {
    b=latch_b(theta);
    phi=is_undef(free_angle)?latch_phi(theta):free_angle;
    color("SlateGray") latch_base();
    color("SteelBlue") translate([catch_distance,0,0]) latch_keeper();
    // Rubber is an envelope, not a constitutive deformation simulation.
    color("SeaGreen") translate([catch_distance,0,0]) latch_epdm(theta,free_angle);
    color("MediumSeaGreen") latch_seam_epdm();
    for(y=[-link_y-link_thickness,link_y]) color("Orange")
        translate([0,y,axis_height]) rotate([0,-theta,0]) latch_link();
    color("DimGray") translate(b) rotate([0,-phi,0]) latch_lever();
    color("Silver") {
        translate([0,0,axis_height]) metal_axle(2*(link_y+link_thickness),axle_a_length);
        translate(b) metal_axle(2*outer_y,axle_b_length);
    }
}
if(part=="base") latch_base();
else if(part=="link") latch_link();
else if(part=="lever") latch_lever();
else if(part=="keeper") latch_keeper();
else if(part=="epdm") latch_epdm();
else if(part=="seam_epdm") latch_seam_epdm();
else if(part=="epdm_nominal") liner_nominal();
else if(part=="epdm_side_template") translate([-keeper_right,0]) intersection() { liner_clip(); keeper_groove_profile(); }
else if(part=="epdm_main_template") square([epdm_main_length,epdm_width]);
else if(part=="axle_a") metal_axle(2*(link_y+link_thickness),axle_a_length);
else if(part=="axle_b") metal_axle(2*outer_y,axle_b_length);
else if(part=="assembly") latch_assembly();
else if(part=="open") latch_assembly(theta=release_angle,free_angle=30);
else if(part=="metrics") echo(METRICS=[link_length,closed_angle,catch_distance,axis_height,link_y,link_thickness,outer_y,keeper_ridge_width,keeper_web_thickness,lever_length,pad_thickness,mount_y,keeper_mount_x,catch_height,axle_a_length,axle_b_length,keeper_height,keeper_top_round,catch_clearance,epdm_thickness,epdm_precompression,epdm_width,keeper_groove_top,0,0,release_angle,keeper_groove_depth,keeper_groove_bottom,keeper_groove_top,hook_underlap,hook_toe_bottom,hook_toe_top,hook_width,hook_tip_fillet,hook_tip_round,keeper_groove_radius,keeper_left,keeper_right,keeper_pad_width,keeper_mount_y,keeper_mount_x2,keeper_groove_width,epdm_main_length]);
else assert(false,"Unknown part");
